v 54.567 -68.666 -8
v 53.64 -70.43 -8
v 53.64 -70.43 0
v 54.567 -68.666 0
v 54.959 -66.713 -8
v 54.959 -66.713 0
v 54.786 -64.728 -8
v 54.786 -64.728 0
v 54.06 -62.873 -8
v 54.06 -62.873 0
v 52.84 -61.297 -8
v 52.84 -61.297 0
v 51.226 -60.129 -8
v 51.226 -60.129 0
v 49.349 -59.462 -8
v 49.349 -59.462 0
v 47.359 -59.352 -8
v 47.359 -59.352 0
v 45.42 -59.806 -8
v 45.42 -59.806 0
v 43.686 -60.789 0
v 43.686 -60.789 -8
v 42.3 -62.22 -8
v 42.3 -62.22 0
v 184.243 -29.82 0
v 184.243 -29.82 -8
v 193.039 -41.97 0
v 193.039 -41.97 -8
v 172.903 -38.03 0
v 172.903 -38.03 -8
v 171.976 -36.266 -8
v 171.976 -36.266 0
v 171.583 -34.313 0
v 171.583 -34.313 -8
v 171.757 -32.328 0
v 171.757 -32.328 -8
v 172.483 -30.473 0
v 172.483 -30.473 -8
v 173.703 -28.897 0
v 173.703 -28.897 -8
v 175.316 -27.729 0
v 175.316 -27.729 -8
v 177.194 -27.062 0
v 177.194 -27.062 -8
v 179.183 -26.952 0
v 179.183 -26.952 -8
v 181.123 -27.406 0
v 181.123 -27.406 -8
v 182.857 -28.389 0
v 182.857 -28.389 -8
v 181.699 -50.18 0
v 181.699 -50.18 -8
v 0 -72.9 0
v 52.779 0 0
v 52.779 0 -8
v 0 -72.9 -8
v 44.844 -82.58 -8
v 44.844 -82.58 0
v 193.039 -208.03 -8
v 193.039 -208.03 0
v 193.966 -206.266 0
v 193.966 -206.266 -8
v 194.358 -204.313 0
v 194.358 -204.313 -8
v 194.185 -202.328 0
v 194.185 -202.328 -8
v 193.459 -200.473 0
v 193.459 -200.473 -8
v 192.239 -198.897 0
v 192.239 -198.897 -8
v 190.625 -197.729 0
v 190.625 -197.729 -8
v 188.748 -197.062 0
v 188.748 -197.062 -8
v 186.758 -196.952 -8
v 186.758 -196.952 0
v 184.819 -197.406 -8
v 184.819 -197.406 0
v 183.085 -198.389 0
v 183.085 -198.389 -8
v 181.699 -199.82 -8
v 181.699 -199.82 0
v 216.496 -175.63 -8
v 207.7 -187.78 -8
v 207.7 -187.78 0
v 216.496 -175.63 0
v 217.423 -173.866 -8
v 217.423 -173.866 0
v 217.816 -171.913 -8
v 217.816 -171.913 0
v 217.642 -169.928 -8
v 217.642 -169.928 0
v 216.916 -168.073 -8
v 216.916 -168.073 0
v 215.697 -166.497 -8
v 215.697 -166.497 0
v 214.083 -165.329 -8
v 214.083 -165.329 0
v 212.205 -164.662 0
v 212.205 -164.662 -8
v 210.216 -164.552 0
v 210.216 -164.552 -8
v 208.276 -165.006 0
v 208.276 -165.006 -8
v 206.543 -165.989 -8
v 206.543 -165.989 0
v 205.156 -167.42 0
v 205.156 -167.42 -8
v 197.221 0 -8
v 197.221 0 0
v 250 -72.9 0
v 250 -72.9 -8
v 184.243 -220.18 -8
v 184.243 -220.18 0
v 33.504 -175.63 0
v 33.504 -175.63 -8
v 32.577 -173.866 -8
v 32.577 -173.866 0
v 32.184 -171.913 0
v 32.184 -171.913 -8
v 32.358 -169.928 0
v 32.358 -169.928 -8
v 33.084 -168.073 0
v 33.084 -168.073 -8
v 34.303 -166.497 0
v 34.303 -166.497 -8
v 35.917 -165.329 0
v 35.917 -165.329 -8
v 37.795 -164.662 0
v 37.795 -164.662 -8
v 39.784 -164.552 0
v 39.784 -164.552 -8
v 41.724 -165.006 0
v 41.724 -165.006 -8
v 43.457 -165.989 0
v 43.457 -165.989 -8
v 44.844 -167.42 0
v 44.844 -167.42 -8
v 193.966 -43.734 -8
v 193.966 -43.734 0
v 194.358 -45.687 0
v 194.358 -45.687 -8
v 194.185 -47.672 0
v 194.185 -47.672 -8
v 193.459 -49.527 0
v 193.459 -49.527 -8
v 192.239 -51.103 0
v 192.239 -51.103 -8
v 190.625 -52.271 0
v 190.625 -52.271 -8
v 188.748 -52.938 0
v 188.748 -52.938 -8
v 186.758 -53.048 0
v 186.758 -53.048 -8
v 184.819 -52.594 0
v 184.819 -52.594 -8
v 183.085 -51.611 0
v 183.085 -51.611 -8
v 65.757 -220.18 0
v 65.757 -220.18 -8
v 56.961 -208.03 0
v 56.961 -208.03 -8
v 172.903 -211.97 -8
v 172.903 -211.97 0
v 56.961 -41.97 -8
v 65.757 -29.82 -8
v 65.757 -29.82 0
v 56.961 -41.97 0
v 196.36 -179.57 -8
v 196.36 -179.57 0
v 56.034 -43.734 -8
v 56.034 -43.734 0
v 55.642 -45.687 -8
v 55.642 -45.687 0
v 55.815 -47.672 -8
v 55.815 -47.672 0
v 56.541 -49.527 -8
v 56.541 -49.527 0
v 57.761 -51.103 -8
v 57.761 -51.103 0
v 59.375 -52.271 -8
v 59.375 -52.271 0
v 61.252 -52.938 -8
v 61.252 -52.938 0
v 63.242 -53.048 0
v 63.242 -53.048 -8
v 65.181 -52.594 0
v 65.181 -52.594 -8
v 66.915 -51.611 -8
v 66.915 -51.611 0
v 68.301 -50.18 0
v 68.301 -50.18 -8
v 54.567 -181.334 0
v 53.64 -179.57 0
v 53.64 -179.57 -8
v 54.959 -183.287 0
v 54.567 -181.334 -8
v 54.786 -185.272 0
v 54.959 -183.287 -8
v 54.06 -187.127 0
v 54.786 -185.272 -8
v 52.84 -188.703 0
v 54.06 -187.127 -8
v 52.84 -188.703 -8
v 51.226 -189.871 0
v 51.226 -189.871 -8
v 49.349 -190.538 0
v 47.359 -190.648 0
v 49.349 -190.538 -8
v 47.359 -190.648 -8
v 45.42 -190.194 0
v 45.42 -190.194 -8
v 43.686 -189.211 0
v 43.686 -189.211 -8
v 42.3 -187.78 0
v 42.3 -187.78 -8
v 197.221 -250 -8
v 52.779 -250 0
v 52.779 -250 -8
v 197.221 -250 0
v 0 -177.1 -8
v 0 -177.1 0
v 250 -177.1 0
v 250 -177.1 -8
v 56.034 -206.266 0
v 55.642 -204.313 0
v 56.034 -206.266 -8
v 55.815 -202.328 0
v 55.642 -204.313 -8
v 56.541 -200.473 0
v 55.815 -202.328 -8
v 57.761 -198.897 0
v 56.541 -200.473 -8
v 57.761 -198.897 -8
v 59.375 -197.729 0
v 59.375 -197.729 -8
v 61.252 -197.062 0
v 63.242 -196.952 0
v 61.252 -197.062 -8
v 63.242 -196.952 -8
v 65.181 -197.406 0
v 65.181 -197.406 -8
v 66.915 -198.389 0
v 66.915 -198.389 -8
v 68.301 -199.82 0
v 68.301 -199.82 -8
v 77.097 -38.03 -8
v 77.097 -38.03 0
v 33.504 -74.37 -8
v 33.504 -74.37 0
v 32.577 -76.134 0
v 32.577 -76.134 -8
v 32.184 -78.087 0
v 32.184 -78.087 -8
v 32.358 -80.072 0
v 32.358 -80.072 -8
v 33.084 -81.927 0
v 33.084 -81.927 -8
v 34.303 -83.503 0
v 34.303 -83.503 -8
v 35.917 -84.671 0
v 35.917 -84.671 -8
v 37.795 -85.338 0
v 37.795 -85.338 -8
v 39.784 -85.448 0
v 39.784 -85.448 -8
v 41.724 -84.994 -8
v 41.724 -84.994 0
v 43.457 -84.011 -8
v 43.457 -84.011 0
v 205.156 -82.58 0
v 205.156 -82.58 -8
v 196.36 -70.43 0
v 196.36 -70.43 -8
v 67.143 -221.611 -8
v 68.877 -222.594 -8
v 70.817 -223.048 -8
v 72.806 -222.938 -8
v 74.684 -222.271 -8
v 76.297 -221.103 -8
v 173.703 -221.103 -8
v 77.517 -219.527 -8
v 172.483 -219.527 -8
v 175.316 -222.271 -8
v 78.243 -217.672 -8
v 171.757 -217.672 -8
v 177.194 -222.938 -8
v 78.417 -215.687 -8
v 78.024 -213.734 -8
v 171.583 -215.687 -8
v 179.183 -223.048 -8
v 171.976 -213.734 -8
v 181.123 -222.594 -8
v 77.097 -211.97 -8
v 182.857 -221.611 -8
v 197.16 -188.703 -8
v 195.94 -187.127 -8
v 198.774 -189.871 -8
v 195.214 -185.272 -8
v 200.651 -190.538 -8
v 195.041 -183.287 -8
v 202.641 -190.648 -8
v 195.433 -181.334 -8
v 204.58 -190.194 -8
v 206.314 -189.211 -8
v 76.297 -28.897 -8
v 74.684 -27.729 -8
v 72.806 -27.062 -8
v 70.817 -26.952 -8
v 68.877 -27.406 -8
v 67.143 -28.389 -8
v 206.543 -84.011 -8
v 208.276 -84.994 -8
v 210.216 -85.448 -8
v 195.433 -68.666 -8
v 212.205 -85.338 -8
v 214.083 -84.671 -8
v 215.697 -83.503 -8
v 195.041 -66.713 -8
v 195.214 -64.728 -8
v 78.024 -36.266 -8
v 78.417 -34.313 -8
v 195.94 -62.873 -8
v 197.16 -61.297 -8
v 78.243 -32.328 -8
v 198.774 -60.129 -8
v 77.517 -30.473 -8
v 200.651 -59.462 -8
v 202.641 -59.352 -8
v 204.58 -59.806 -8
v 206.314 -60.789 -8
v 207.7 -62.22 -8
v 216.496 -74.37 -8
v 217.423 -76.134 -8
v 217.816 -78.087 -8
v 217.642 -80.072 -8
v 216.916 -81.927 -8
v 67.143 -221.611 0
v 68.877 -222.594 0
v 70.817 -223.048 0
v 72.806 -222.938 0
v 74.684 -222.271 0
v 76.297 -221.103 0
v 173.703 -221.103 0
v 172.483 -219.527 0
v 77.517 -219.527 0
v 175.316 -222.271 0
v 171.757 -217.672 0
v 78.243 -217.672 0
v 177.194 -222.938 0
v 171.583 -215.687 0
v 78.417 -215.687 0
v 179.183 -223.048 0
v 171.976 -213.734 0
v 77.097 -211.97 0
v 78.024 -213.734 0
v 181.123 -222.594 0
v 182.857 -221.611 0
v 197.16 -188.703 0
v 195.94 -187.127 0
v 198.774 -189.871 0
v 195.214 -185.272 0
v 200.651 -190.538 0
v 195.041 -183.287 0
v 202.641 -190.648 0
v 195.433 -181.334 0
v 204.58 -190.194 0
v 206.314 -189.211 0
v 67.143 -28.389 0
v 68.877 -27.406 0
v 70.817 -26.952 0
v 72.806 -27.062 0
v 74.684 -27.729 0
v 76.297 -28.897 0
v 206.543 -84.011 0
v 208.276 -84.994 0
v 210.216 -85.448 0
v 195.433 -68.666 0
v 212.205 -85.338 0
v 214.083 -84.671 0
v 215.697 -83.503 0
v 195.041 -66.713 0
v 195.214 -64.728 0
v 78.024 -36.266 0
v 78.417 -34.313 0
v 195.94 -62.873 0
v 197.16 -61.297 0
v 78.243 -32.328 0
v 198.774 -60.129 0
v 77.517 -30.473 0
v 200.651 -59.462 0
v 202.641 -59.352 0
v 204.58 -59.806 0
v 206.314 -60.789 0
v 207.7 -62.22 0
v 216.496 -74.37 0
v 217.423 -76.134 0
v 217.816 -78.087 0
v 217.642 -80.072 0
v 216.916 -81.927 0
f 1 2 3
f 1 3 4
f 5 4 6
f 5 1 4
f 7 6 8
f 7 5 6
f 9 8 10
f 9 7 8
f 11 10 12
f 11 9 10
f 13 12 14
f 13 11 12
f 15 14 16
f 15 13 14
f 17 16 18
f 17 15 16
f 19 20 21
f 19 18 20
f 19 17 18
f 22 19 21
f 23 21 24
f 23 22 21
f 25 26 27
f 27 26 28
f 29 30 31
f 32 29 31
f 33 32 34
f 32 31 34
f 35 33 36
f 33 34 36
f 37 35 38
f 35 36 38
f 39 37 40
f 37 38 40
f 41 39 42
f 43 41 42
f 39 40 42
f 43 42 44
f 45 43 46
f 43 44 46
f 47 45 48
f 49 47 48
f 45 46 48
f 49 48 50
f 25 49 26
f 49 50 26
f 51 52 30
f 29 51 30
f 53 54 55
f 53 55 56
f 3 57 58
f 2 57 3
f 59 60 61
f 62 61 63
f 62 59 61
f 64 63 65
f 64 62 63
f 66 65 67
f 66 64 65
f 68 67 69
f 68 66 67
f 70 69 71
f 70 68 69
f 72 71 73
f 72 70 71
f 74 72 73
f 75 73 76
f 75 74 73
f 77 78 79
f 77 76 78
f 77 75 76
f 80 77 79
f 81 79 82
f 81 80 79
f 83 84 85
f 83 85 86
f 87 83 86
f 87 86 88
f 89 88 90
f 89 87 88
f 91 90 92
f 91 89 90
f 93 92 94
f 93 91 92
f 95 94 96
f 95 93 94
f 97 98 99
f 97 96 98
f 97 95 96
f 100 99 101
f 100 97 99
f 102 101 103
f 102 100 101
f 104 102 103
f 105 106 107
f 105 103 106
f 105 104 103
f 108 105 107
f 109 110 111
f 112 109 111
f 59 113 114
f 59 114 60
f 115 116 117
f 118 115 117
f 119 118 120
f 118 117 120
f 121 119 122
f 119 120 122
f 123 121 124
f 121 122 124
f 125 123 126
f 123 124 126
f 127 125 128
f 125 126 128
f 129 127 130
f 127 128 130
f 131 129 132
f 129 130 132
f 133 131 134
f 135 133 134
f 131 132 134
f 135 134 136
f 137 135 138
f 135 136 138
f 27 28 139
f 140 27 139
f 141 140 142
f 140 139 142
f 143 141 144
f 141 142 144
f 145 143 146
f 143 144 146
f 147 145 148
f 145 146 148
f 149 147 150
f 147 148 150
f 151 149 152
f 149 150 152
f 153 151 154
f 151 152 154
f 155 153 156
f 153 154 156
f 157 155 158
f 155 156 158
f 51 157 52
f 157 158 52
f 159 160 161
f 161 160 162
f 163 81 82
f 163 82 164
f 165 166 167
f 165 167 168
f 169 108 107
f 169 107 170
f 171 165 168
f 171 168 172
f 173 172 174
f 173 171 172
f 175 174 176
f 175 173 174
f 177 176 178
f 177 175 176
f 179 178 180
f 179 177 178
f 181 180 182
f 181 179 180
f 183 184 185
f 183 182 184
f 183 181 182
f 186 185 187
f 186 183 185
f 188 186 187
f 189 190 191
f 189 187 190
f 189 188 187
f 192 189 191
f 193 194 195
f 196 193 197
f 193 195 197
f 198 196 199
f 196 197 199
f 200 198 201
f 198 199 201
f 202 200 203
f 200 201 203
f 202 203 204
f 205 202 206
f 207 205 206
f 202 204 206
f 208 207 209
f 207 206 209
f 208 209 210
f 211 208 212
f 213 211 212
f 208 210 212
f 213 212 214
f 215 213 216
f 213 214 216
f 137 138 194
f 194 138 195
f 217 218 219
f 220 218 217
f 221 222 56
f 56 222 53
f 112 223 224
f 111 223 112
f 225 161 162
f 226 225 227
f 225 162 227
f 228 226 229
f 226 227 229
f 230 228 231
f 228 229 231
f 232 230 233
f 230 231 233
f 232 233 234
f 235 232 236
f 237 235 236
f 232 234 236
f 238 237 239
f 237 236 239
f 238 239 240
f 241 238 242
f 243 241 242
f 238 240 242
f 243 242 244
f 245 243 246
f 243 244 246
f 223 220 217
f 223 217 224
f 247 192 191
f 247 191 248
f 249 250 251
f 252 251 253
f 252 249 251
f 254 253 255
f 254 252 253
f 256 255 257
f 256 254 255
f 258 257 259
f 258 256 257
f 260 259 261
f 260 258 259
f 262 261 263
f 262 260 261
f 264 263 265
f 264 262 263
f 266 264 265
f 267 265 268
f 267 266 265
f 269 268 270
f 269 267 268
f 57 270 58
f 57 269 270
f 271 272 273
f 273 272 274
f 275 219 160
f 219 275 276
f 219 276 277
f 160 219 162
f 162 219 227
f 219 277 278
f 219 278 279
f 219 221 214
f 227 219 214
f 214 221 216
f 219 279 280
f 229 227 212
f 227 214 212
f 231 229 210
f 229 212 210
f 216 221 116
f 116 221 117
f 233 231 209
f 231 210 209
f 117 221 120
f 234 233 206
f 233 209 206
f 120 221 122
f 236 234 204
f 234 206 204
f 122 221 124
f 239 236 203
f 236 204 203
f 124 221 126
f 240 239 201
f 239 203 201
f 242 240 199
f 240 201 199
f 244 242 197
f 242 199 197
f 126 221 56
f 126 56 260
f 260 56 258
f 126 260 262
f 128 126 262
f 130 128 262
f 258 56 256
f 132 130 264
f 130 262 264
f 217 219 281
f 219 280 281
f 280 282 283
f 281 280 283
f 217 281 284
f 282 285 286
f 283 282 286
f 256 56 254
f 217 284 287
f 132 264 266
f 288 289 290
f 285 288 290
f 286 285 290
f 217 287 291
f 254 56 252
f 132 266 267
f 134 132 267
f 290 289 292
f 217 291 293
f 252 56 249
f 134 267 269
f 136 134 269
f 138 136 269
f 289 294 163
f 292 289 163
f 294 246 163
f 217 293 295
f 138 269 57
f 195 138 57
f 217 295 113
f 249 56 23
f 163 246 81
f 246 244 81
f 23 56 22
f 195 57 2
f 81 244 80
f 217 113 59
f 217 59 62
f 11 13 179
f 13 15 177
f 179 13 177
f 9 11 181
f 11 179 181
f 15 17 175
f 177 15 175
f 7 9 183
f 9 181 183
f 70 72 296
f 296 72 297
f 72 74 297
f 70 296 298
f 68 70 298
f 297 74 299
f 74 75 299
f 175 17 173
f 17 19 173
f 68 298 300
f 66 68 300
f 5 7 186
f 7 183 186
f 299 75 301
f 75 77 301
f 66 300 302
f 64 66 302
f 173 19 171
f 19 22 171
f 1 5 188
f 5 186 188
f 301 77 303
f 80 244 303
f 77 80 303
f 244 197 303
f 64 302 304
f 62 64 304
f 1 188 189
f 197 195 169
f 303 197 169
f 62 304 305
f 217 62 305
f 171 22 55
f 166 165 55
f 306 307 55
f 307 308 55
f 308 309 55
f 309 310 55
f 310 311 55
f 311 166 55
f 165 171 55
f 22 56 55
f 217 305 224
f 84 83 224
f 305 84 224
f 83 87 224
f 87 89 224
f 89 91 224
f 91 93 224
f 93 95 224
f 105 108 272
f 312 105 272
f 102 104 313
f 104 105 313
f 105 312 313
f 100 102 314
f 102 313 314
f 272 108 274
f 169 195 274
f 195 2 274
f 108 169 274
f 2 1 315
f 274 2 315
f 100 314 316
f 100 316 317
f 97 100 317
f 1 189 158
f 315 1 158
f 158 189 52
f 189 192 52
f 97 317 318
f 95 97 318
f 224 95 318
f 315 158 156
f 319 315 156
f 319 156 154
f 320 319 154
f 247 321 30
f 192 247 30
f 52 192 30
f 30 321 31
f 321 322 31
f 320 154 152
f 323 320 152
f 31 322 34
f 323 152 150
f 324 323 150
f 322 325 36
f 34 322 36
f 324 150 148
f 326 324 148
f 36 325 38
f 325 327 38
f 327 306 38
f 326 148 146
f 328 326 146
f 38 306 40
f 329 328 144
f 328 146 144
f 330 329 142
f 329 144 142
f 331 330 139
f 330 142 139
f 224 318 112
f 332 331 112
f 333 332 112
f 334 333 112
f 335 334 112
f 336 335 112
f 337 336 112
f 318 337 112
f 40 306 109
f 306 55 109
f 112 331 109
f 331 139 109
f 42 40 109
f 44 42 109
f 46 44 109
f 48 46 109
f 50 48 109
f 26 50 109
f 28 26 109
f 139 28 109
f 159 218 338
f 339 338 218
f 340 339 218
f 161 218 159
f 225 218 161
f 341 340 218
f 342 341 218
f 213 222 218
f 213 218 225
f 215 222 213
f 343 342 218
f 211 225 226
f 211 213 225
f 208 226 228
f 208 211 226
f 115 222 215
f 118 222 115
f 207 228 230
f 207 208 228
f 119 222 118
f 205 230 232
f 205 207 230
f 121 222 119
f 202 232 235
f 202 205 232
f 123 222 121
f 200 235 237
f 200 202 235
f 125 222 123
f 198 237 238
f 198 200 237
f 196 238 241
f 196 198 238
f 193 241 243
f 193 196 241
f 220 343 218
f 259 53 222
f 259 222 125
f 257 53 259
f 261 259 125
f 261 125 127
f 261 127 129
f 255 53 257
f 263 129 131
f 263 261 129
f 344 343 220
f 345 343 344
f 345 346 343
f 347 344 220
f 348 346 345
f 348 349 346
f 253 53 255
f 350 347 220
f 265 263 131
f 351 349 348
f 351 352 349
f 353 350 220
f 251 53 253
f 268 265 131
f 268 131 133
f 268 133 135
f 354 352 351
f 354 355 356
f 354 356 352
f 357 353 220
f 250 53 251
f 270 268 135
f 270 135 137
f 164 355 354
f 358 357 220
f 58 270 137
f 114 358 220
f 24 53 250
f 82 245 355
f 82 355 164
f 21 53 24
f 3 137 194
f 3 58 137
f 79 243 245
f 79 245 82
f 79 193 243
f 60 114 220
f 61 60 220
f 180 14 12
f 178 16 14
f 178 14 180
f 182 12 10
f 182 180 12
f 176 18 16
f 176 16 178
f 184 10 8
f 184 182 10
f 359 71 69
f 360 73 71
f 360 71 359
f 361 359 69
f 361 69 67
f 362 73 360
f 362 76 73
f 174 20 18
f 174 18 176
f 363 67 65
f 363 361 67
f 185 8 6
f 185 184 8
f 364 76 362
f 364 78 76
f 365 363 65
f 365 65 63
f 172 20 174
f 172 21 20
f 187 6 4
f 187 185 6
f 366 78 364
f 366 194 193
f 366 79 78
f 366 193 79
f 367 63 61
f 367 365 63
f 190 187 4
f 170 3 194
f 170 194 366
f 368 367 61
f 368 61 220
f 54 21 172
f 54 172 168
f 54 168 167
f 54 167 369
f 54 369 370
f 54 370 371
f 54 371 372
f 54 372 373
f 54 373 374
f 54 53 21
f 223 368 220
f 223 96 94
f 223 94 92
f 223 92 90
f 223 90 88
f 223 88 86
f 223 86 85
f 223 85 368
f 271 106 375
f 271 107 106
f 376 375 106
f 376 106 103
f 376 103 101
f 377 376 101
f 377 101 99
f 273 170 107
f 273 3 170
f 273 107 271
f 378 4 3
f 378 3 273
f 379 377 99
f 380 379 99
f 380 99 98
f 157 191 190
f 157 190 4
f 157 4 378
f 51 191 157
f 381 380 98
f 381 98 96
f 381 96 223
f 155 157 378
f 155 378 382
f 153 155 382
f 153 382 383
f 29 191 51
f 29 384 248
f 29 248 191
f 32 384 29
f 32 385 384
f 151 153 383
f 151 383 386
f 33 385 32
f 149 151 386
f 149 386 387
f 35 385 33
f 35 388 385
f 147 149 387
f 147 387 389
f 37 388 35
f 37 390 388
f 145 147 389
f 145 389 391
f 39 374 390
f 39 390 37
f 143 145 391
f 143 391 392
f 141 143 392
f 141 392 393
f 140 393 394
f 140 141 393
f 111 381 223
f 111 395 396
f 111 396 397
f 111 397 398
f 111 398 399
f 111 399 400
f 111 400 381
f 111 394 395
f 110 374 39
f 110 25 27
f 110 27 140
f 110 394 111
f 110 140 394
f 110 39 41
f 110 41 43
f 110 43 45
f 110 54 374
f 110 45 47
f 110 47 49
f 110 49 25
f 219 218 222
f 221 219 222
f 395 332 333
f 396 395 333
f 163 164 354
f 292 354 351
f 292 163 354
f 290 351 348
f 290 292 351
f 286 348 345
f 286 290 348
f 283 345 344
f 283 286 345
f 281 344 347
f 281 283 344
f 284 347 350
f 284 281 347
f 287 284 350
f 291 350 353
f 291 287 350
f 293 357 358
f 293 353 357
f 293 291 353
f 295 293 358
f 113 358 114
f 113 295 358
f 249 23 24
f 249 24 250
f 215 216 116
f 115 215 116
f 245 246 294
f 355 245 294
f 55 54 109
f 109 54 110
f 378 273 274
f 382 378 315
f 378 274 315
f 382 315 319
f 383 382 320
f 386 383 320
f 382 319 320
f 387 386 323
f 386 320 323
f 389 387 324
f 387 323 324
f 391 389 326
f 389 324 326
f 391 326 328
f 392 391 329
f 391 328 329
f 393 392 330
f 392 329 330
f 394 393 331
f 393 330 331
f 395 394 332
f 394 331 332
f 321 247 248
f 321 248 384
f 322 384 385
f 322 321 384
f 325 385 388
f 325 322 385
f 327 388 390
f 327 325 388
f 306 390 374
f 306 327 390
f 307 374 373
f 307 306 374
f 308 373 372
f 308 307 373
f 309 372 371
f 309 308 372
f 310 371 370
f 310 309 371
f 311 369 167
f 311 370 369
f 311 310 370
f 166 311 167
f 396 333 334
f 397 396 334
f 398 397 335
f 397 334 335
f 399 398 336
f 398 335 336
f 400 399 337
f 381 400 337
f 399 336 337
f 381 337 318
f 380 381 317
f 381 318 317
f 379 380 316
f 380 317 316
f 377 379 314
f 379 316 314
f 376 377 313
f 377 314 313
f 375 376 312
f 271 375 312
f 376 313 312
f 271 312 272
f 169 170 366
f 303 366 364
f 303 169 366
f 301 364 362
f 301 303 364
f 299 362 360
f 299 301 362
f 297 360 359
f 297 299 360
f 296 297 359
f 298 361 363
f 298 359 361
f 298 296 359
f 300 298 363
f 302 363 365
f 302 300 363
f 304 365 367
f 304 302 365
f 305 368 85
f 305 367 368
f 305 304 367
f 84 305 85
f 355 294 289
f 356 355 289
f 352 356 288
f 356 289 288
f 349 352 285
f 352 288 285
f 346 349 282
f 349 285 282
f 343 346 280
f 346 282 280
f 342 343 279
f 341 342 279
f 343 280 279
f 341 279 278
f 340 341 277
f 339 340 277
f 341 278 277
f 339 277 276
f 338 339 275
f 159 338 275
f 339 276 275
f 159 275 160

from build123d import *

# Parameters (mm, degrees)
SKETCH_1_W             = 250
SKETCH_1_H             = 250
SM_BASE_FLANGE_1_DEPTH = 8
CUT_EXTRUDE_1_DEPTH    = 10
CUT_EXTRUDE_2_DEPTH    = 10


# Sheet-metal steps are written as plain solids
with BuildPart() as part:
    # Sketch 1 → Базовая кромка1 (new body)
    with BuildSketch(Plane.XY):
        with Locations((125, -125)):
            Rectangle(SKETCH_1_W, SKETCH_1_H)
    extrude(amount=-SM_BASE_FLANGE_1_DEPTH)

    # Sketch 2 → Вырез-Вытянуть1 (cut)
    with BuildSketch(Plane.XY):
        Polygon((52.778688881, 0), (0, -72.9), (0, 0), align=None)
        Polygon((250, 0), (197.221311119, 0), (250, -72.9), align=None)
        Polygon((197.221311119, -250), (250, -177.1), (250, -250), align=None)
        Polygon((0, -250), (52.778688881, -250), (0, -177.1), align=None)
    extrude(amount=-CUT_EXTRUDE_1_DEPTH, mode=Mode.SUBTRACT)

    # Эскиз3 → Вырез-Вытянуть2 (cut)
    with BuildSketch(Plane(origin=(0, 0, -8), x_dir=(-1, 0, 0), z_dir=(0, 0, -1))):
        with BuildLine():
            Line((-65.757289426, -29.819990865), (-56.960841279, -41.969990865))
            ThreePointArc((-56.960841279, -41.969990865), (-58.525832144, -51.745), (-68.300841279, -50.180009135))
            Line((-68.300841279, -50.180009135), (-77.097289426, -38.030009135))
            ThreePointArc((-77.097289426, -38.030009135), (-75.532298561, -28.255), (-65.757289426, -29.819990865))
        make_face()
        with BuildLine():
            Line((-42.300094368, -62.219990865), (-33.503646221, -74.369990865))
            ThreePointArc((-33.503646221, -74.369990865), (-35.068637085, -84.145), (-44.843646221, -82.580009135))
            Line((-44.843646221, -82.580009135), (-53.640094368, -70.430009135))
            ThreePointArc((-53.640094368, -70.430009135), (-52.075103503, -60.655), (-42.300094368, -62.219990865))
        make_face()
        with BuildLine():
            Line((-184.242710574, -29.819990865), (-193.039158721, -41.969990865))
            ThreePointArc((-193.039158721, -41.969990865), (-191.474167856, -51.745), (-181.699158721, -50.180009135))
            Line((-181.699158721, -50.180009135), (-172.902710574, -38.030009135))
            ThreePointArc((-172.902710574, -38.030009135), (-174.467701439, -28.255), (-184.242710574, -29.819990865))
        make_face()
        with BuildLine():
            Line((-207.699905632, -62.219990865), (-216.496353779, -74.369990865))
            ThreePointArc((-216.496353779, -74.369990865), (-214.931362915, -84.145), (-205.156353779, -82.580009135))
            Line((-205.156353779, -82.580009135), (-196.359905632, -70.430009135))
            ThreePointArc((-196.359905632, -70.430009135), (-197.924896497, -60.655), (-207.699905632, -62.219990865))
        make_face()
        with BuildLine():
            Line((-65.757289426, -220.180009135), (-56.960841279, -208.030009135))
            ThreePointArc((-56.960841279, -208.030009135), (-58.525832144, -198.255), (-68.300841279, -199.819990865))
            Line((-68.300841279, -199.819990865), (-77.097289426, -211.969990865))
            ThreePointArc((-77.097289426, -211.969990865), (-75.532298561, -221.745), (-65.757289426, -220.180009135))
        make_face()
        with BuildLine():
            Line((-42.300094368, -187.780009135), (-33.503646221, -175.630009135))
            ThreePointArc((-33.503646221, -175.630009135), (-35.068637085, -165.855), (-44.843646221, -167.419990865))
            Line((-44.843646221, -167.419990865), (-53.640094368, -179.569990865))
            ThreePointArc((-53.640094368, -179.569990865), (-52.075103503, -189.345), (-42.300094368, -187.780009135))
        make_face()
        with BuildLine():
            Line((-184.242710574, -220.180009135), (-193.039158721, -208.030009135))
            ThreePointArc((-193.039158721, -208.030009135), (-191.474167856, -198.255), (-181.699158721, -199.819990865))
            Line((-181.699158721, -199.819990865), (-172.902710574, -211.969990865))
            ThreePointArc((-172.902710574, -211.969990865), (-174.467701439, -221.745), (-184.242710574, -220.180009135))
        make_face()
        with BuildLine():
            Line((-207.699905632, -187.780009135), (-216.496353779, -175.630009135))
            ThreePointArc((-216.496353779, -175.630009135), (-214.931362915, -165.855), (-205.156353779, -167.419990865))
            Line((-205.156353779, -167.419990865), (-196.359905632, -179.569990865))
            ThreePointArc((-196.359905632, -179.569990865), (-197.924896497, -189.345), (-207.699905632, -187.780009135))
        make_face()
    extrude(amount=-CUT_EXTRUDE_2_DEPTH, mode=Mode.SUBTRACT)


solid = part.part
